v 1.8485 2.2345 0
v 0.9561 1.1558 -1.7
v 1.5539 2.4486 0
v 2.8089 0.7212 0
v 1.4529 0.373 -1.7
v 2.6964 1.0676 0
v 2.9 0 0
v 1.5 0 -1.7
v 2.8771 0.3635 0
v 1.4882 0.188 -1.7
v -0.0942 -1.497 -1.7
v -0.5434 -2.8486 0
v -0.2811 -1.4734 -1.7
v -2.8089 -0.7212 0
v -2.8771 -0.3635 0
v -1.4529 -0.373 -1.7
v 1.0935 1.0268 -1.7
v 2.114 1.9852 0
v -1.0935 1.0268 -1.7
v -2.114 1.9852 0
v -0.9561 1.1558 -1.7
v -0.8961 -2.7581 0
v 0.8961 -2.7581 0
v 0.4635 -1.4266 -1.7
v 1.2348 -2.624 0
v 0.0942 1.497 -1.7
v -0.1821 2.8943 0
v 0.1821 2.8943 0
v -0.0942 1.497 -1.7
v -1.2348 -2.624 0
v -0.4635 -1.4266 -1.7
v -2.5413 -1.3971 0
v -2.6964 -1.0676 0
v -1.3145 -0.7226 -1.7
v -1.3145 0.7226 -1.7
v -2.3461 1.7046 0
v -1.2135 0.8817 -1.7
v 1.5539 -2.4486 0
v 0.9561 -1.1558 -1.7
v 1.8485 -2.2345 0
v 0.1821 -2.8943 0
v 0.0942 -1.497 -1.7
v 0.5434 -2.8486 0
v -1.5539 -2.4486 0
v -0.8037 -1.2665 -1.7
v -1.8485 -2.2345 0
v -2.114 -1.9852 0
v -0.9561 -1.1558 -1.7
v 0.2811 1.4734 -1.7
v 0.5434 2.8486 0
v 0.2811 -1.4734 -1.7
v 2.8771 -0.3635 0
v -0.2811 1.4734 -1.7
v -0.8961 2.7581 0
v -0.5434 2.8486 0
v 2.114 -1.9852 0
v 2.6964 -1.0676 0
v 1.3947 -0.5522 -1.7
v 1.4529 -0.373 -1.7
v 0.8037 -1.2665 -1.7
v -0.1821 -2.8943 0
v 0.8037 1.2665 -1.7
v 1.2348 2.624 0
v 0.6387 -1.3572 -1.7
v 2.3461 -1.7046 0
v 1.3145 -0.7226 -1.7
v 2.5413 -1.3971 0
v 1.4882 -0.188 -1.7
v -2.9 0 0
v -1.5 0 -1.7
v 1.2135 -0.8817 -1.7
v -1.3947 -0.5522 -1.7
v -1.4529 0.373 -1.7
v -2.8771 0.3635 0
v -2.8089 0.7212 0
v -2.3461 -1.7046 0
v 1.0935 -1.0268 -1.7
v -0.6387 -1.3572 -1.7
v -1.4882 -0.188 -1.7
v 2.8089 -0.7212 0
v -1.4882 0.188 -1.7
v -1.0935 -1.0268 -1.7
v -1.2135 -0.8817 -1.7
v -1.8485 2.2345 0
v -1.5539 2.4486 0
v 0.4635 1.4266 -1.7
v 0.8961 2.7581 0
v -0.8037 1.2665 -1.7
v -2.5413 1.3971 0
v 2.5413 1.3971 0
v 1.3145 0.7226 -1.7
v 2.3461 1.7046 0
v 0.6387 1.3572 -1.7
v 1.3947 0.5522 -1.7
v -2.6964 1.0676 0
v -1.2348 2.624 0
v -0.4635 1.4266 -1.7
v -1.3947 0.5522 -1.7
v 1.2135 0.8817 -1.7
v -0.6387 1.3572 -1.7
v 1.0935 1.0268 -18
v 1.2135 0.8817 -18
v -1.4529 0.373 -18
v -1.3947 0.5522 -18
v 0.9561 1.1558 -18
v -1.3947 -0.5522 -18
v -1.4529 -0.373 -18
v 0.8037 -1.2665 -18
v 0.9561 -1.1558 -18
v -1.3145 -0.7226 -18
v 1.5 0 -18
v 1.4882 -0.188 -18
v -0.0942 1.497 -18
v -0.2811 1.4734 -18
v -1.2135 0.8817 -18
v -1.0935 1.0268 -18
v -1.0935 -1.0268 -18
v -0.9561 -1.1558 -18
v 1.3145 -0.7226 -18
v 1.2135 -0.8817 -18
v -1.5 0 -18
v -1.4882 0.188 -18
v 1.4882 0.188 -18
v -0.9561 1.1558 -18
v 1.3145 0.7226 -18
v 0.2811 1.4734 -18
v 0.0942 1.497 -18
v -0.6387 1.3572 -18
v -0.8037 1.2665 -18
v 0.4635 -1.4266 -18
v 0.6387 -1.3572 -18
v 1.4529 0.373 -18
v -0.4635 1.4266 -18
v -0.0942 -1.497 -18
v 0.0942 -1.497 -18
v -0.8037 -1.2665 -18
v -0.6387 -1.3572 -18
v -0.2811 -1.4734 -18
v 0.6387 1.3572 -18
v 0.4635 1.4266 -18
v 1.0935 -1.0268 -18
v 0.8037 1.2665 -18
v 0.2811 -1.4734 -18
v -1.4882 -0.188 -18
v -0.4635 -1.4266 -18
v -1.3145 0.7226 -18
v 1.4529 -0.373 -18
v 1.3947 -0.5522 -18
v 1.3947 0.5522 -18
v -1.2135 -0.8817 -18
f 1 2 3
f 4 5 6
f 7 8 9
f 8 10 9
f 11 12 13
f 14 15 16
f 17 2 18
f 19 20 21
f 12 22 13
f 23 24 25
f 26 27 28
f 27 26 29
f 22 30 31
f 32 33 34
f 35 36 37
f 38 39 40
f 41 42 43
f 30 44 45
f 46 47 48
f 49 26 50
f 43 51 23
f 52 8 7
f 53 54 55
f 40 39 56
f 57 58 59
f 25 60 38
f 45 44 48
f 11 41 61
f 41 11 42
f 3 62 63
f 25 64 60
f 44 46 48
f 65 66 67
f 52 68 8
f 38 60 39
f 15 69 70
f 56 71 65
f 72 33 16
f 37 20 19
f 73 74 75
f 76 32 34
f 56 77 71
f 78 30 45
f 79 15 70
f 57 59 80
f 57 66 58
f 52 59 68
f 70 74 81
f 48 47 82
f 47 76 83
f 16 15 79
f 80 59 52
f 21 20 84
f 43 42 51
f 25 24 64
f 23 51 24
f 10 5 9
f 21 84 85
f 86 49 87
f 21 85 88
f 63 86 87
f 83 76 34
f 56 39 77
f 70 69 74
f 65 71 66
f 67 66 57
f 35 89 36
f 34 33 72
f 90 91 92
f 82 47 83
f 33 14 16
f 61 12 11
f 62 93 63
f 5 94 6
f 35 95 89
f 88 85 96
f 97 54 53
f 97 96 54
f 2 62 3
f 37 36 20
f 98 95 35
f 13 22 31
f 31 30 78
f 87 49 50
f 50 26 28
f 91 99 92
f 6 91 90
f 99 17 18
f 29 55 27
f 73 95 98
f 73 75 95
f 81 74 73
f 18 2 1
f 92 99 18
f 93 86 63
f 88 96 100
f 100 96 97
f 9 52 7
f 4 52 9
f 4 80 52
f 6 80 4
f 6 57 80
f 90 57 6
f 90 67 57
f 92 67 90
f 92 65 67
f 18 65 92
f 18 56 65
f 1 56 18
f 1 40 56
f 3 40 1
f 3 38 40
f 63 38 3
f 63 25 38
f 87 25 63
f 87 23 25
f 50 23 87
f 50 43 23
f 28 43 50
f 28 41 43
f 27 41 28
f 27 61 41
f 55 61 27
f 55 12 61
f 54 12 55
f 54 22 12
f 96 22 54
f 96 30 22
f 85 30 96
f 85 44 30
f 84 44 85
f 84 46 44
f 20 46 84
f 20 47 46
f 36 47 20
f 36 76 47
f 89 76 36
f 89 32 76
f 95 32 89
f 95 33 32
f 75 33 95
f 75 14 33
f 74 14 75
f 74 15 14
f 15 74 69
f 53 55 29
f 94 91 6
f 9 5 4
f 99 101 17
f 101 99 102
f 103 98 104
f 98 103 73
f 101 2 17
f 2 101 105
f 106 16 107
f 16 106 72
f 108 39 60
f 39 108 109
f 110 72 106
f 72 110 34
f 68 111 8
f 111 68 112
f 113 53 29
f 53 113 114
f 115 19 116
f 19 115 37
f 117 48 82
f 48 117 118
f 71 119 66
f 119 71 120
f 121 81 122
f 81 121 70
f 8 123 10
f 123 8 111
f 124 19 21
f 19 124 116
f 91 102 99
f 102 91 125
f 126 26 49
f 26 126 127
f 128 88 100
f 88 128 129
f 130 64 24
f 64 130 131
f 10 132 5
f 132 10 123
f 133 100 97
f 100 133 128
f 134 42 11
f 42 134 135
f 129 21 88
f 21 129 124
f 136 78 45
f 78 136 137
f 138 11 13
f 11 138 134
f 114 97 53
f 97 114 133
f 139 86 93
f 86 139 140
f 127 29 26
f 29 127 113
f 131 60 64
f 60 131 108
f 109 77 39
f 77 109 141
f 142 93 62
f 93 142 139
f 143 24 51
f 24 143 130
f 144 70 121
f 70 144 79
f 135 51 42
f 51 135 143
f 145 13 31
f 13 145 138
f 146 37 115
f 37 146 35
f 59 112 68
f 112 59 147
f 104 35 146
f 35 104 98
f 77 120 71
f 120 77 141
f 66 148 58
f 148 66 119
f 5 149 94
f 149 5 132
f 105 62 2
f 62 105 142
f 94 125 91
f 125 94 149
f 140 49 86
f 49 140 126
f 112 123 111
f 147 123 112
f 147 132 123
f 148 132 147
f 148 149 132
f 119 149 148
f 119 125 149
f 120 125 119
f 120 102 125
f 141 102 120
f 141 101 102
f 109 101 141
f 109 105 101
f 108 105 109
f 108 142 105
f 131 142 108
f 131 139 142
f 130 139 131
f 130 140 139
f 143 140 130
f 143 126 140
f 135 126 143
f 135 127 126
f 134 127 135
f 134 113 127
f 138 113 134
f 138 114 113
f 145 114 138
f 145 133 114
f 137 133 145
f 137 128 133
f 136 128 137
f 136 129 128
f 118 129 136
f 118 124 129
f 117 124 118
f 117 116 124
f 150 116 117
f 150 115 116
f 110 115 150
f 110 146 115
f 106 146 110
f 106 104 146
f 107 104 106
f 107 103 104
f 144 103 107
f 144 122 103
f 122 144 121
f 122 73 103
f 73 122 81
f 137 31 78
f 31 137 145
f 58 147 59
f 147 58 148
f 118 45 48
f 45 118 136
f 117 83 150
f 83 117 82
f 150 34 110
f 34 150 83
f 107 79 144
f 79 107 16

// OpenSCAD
// Generated by SolidPython 1.1.3 on 2023-03-13 21:43:02
$fn = 50;


difference() {
	union() {
		translate(v = [0, 0, -1.7000000000]) {
			rotate(a = [0, 0, 0]) {
				cylinder(h = 1.7000000000, r1 = 1.5000000000, r2 = 2.9000000000);
			}
		}
		translate(v = [0, 0, -18]) {
			rotate(a = [0, 0, 0]) {
				cylinder(h = 18, r = 1.5000000000);
			}
		}
	}
	union();
}
/***********************************************
*********      SolidPython code:      **********
************************************************
 
from solid import *
import os
import subprocess

import oomB

import opsc_library_gen

mode = "laser"
#mode = "3d_print"

defined_objects = {}

radius_dict = {}
countersunk_dict = {}


def set_mode(m):
    global mode
    mode = m
    radius_dict['M6'] = 6.5/2
    radius_dict['M3'] = 3.3/2
    if mode == "laser":
        radius_dict['M6'] = 6/2
        radius_dict['M3'] = 3/2

    countersunk_dict['M3'] = {}
    countersunk_dict['M3']['little_rad'] = radius_dict['M3']
    countersunk_dict['M3']['big_rad'] = (5.5+0.6)/2
    if mode == "laser":
        countersunk_dict['M3']['big_rad'] = (4.75+0.6)/2
        countersunk_dict['M3']['little_rad'] = (4.75+0.6)/2

    countersunk_dict['M3']['height'] = 1.7


def opsc_make_object(filename, objects, save_type="none",resolution=50, layers = 1, tilediff = 200, mode="laser", overwrite=True):
    if overwrite or not os.path.exists(filename):
        set_mode(mode)
        save_type = save_type.lower()
        os.makedirs(os.path.dirname(filename), exist_ok=True)
        final_object = opsc_get_object(objects, mode = mode)
        # Save the final object to the specified filename    
        scad_render_to_file(final_object, filename, file_header='$fn = %s;' % resolution, include_orig_code=True)
        if save_type == "all":
            saveToAll(filename)
        elif save_type == "dxf":
            saveToDxf(filename)
        if mode == "laser":
            filename_laser = filename.replace(".scad","-flat.scad")
            scad_render_to_file(getLaser(final_object, layers=layers, tilediff=tilediff), filename_laser, file_header='$fn = %s;' % resolution, include_orig_code=True)
            if save_type == "all":
                saveToAll(filename_laser)
            elif save_type == "dxf":
                saveToDxf(filename_laser)


def opsc_get_object(objects, mode = "laser"):
    # Create the solidpython objects only include the positive objects and if they don't have inclusion or their inclusion is either all or mode
    # Initialize an empty list to store the results
    positive_objects = []

    # Iterate over the "objects" list
    for obj in objects:
        # Check if the current object has a "type" key with a value of "positive"
        if obj['type'] == 'positive':
            # Check if the current object has an "inclusion" key and its value matches "mode",
            # or if the current object does not have an "inclusion" key at all
            if not 'inclusion' in obj or obj['inclusion'] == "all" or obj['inclusion'] == mode:
                # Call the "get_opsc_item" function with the current object as an argument
                opsc_item = get_opsc_item(obj)
                # Add the result to the "positive_objects" list
                positive_objects.append(opsc_item)
# Initialize an empty list to store the results
    negative_objects = []

    # Iterate over the "objects" list
    for obj in objects:
        # Check if the current object has a "type" key with a value of "negative"
        if obj['type'] == 'negative':
            # Check if the current object has an "inclusion" key and its value matches "mode",
            # or if the current object does not have an "inclusion" key at all
            if not 'inclusion' in obj or obj['inclusion'] == "all" or obj['inclusion'] == mode:
                # Call the "get_opsc_item" function with the current object as an argument
                opsc_item = get_opsc_item(obj)
                # Add the result to the "negative_objects" list
                negative_objects.append(opsc_item)
    
    #positive_objects = [get_opsc_item(obj) for obj in objects if obj['type'] == 'positive']
    #negative_objects = [get_opsc_item(obj) for obj in objects if obj['type'] == 'negative']
    # Union the positive objects
    positive_object = union()(*positive_objects)
    # Union the negative objects
    negative_object = union()(*negative_objects)
    # Create the final object by subtracting the negative objects from the positive objects
    return difference()(positive_object, negative_object)

def get_opsc_item(params):
    # A dictionary to map radius string values to numerical values
    #radius_dict = {'small': 5, 'medium': 10, 'large': 15}
    # An array of function names for basic shapes
    basic_shapes = ['cube', 'sphere', 'cylinder']
    
    # An array of function names for other shapes
    other_shapes = ['hole', 'slot', 'rounded_rectangle', 'countersunk', 'polyg']
    


    # Convert radius to r if present, and remove radius from the params dictionary
    if 'radius' in params:
        if isinstance(params['radius'], str):
            # Use the radius_dict to map the radius string value to a numerical value
            params['r'] = radius_dict[params['radius']]
        else:
            params['r'] = params['radius']
        del params['radius']
    

    # Check if the object type is a basic shape
    if params['shape'] in basic_shapes:
        # Remove shape and unexpected dictionary values
        allowed_keys = {'size', 'r', 'r1', 'r2', 'd', 'h', 'rw', 'rh', 'dw', 'dh'}
        shape_params = {k: v for k, v in params.items() if k in allowed_keys}

        #params['m'] = "#"
        ###split for adding modifier
        try:
            m = params['m']
            func = globals()[params['shape']]
            return_value = get_opsc_transform(params,func(**shape_params))
            return_value = (return_value).set_modifier(m)
            return return_value
        except KeyError as e:
            return get_opsc_transform(params,globals()[params['shape']](**shape_params))
        
    elif params['shape'] == 'polygon':
        # Remove shape and unexpected dictionary values
        h  = params['height']
        allowed_keys = {'points'}
        shape_params = {k: v for k, v in params.items() if k in allowed_keys}

        # Call the corresponding function for the shape parameter, using ** notation to pass the shape_params dictionary as keyword arguments
        params["rot"] = [0,0,0]        
        try:
            m = params['m']
            func = globals()[params['shape']]
            return_value = get_opsc_transform(params,linear_extrude(h)(globals()[params['shape']](**shape_params)))
            return_value = (return_value).set_modifier(m)
            return return_value
        except KeyError as e:
            return_value = get_opsc_transform(params,linear_extrude(h)(globals()[params['shape']](**shape_params)))
            return_value = (return_value)
            return return_value


    # If the object type is not a basic shape, check if it's a defined object or one of the other shapes
    elif params['shape'] in other_shapes:
        # Call the corresponding function for the shape parameter, passing the params dictionary as an argument
        p2 = copy.deepcopy(params)
        p2["pos"] = [0,0,0]
        return get_opsc_transform(params,globals()[params['shape']](p2))
    
    # If the object is not a basic shape or a defined object, try to import it from a .scad file
    else:
        obj = defined_objects[params['shape']]
        return get_opsc_transform(params,obj)

def get_opsc_transform(params, solid_obj):
    # Rotate the object based on the 'rot' field in the params dictionary, or the 'rotX', 'rotY', and 'rotZ' fields if 'rot' is not present
    rot = params.get('rot', [])
    if rot:
        rotX, rotY, rotZ = rot
    else:
        rotX = params.get('rotX', 0)
        rotY = params.get('rotY', 0)
        rotZ = params.get('rotZ', 0)
    solid_obj = rotate([rotX, rotY, rotZ])(solid_obj)

    # Translate the object based on the 'pos' field in the params dictionary, or the 'x', 'y', and 'z' fields if 'pos' is not present
    pos = params.get('pos', [])
    if pos:
        x, y, z = pos
    else:
        x = params.get('x', 0)
        y = params.get('y', 0)
        z = params.get('z', 0)
    solid_obj = translate([x, y, z])(solid_obj)
    return solid_obj


import random

def opsc_easy_array(type, shape, repeats, pos_start, shift_arr, **kwargs):
    for i in range(0,3):
        repeats.append(1)
        pos_start.append(0)
        shift_arr.append(0)
    return_objects = []

    for x in range(0,repeats[0]):
        for y in range(0,repeats[1]):
            for z in range(0,repeats[2]):
                return_objects.append(opsc_easy(type, shape, pos=[pos_start[0]+x*shift_arr[0],pos_start[1]+y*shift_arr[1],pos_start[2]+z*shift_arr[2]], **kwargs))
    return return_objects                



def opsc_easy(type, shape, **kwargs):
    obj = {
        'type': type,
        'shape': shape
    }
    for param in ['size', 'r', 'r1', 'r2', 'd', 'h', 'rw', 'rh', 'dw', 'dh', 'pos', 'x', 'y', 'z', 'rot', 'rotX', 'rotY', 'rotZ', "w", "inclusion", 'sides', 'height', "m"]:
        if param in kwargs:
            obj[param] = kwargs[param]
    return obj

def hole(params):
    p2 = copy.deepcopy(params)  
    # Check if the radius is a string and replace it with the corresponding value from the dictionary
    if isinstance(p2['r'], str):
        p2['r'] = radius_dict[p2['r']]
    
    # Set the height to 100 if not specified
    if 'h' not in p2:
        p2['h'] = 100
        p2["pos"] = [0,0,-50]
    p2["center"] = True
    # Create the cylinder object
    p2["shape"] = "cylinder"
    p2["type"] = "positive"

    return get_opsc_item(p2)

import copy

def countersunk(params):
    p2 = copy.deepcopy(params)
    counter_rad = p2['r']
    p2['r'] = radius_dict[p2['r']]
    hp = copy.deepcopy(p2)
    hp["type"] = "positive"
    hp["shape"] = "hole"
    del hp["rot"]
    hol = get_opsc_item(hp)
    
    cp = copy.deepcopy(p2)
    cp["h"] = countersunk_dict[counter_rad]["height"]
    cp["r2"] = countersunk_dict[counter_rad]["little_rad"]
    cp["r1"] = countersunk_dict[counter_rad]["big_rad"]
    del cp["r"]
    del cp["rot"]
    cp["type"] = "positive"
    cp["shape"] = "cylinder"
    cp["pos"] = [0,0,0]

    top = get_opsc_item(cp)
    return union()(hol,top)



def slot(params):  
    p2 = copy.deepcopy(params) 
    if isinstance(p2['r'], str):
        p2['r'] = radius_dict[p2['r']]
    p2["type"] = "positive"
    p2["shape"] = "hole"
    del p2["rot"]
    p2["pos"] = [0,0,0]
    left = copy.deepcopy(p2)
    right = copy.deepcopy(p2)
    left["pos"][0] = p2["w"] / 2 - p2["r"] 
    
    right["pos"][0] = -p2["w"] / 2 + p2["r"] 
    pass
    leftObj = get_opsc_item(left)
    rightObj = get_opsc_item(right)
    return hull()(leftObj, rightObj)

def rounded_rectangle(params):   
    p2 = copy.deepcopy(params) 
    p2["h"] = p2["size"][2]
    p2["pos"] = p2.get("pos", [0, 0, 0]) 
    p2["type"] = "positive"
    p2["shape"] = "hole"
    p2["pos"] = [0,0,0]
    
    if 'rot' in p2:
        del p2["rot"]   
    if 'r' not in p2:
        p2["r"] = 5 
    tl = copy.deepcopy(p2)
    tr = copy.deepcopy(p2)
    bl = copy.deepcopy(p2)
    br = copy.deepcopy(p2)
    tl["pos"][0] = -(p2["size"][0] - p2["r"]*2)/2
    tl["pos"][1] = (p2["size"][1] - p2["r"]*2)/2
    tr["pos"][0] = (p2["size"][0] - p2["r"]*2)/2
    tr["pos"][1] = (p2["size"][1] - p2["r"]*2)/2
    bl["pos"][0] = -(p2["size"][0] - p2["r"]*2)/2
    bl["pos"][1] = -(p2["size"][1] - p2["r"]*2)/2
    br["pos"][0] = (p2["size"][0] - p2["r"]*2)/2
    br["pos"][1] = -(p2["size"][1] - p2["r"]*2)/2
    del tl["size"]
    del tr["size"]
    del bl["size"]
    del br["size"]
    tlo = get_opsc_item(tl)
    tro = get_opsc_item(tr)
    blo = get_opsc_item(bl)
    bro = get_opsc_item(br)    
    return hull()(tlo, tro, blo, bro)



def polyg(params):
    p2 = copy.deepcopy(params) 
    p2["type"] = "positive"
    p2["shape"] = "polygon"
    p2["pos"] = [0,0,0]
    sides = p2["sides"]
    radius = p2["r"]    
    angles = [i * 360 / sides for i in range(sides)]
    points = regular_polygon(sides, radius)
    
    p2["points"] = points
    return get_opsc_item(p2)

import math

def regular_polygon(num_sides, radius):
    # Calculate the angle between each side
    angle = 2 * math.pi / num_sides

    # Calculate the points of the polygon
    points = []
    for i in range(num_sides):
        x = radius * math.cos(i * angle)
        y = radius * math.sin(i * angle)
        points.append((x, y))
    return points

def import_scad_object(filename):
    # Import the .scad file and convert it to a solidpython object
    #filename = "parts"
    obj = import_scad(filename)
    return obj.main()



import os
import solid as solidpython

# A dictionary to store the defined objects


def load_scad_objects():
    opsc_library_gen.gen_library(defined_objects)

import random

def test(num_objects):
    objects = []
    for i in range(num_objects):
        # Choose a random shape
        #shape = random.choice(['cube', 'sphere', 'cylinder', 'hole', 'slot', "rounded_rectangle"])
        shape = random.choice(["rounded_rectangle"])

        # Choose a random type
        type = random.choice(['positive', 'negative'])
        
        # Create an empty object dictionary
        obj = {'shape': shape, 'type': type}
        
        # Set shape-specific parameters
        if obj['shape'] in ['cube']:
            obj['size'] =  [random.uniform(5, 15), random.uniform(5, 15), random.uniform(5, 15)]
        if obj['shape'] in ['rounded_rectangle']:
            obj['size'] =  [random.uniform(5, 15), random.uniform(5, 15), random.uniform(5, 15)]
            obj['r'] = random.uniform(0.5, 5)
        elif obj['shape'] == 'sphere':
            obj['r'] = random.uniform(5, 15)
        elif obj['shape'] in ['cylinder', 'hole']:
            obj['r'] = random.uniform(0.5, 5)
            obj['h'] = random.uniform(5, 15)
        elif obj['shape'] == 'slot':
            obj['r'] = random.uniform(0.5, 5)
            obj['h'] = random.uniform(5, 15)
            obj['w'] = random.uniform(5, 15)
        
        # Set a random position and rotation
        obj['pos'] = [random.uniform(-20, 20), random.uniform(-20, 20), random.uniform(-20, 20)]
        obj['rot'] = [random.uniform(-180, 180), random.uniform(-180, 180), random.uniform(-180, 180)]
        
        # Add the object to the list
        objects.append(obj)
    return objects

####### old file saving
def saveToAll(fileIn):
    saveToStl(fileIn)
    saveToDxf(fileIn)
    saveToPng(fileIn)
    saveToSvg(fileIn)

def saveToDxf(fileIn, fileOut="", copy_to_laser=True):
    if fileOut == "":
        fileOut = fileIn.replace(".scad",".dxf")
    saveToFile(fileIn, fileOut)


    
def saveToPng(fileIn, fileOut="",extra="--render"):
    if fileOut == "":
        fileOut = fileIn.replace(".scad",".png")
    saveToFile(fileIn, fileOut)

def saveToStl(fileIn, fileOut=""):
    if fileOut == "":
        fileOut = fileIn.replace(".scad",".stl")
    saveToFile(fileIn, fileOut)
    
def saveToSvg(fileIn, fileOut=""):
    if fileOut == "":
        fileOut = fileIn.replace(".scad",".svg")
    saveToFile(fileIn, fileOut)

def saveToFile(fileIn, fileOut,extra=""):
    #extra = extra + " --colorscheme Tomorrow"

    launchStr = 'openscad -o "' + fileOut + '"' + extra + ' "' + fileIn + '"'
    if ".png" in fileOut:
        launchStr = launchStr + " --render"
    print("            saveToFile launch string: " + launchStr)
    subprocess.run(launchStr)
    x=0

def getLaser(final_object,start=1.5,layers=1,thickness=3,tilediff=200):
        rv= []

        for x in range(layers):
            rv.append(translate([0,x*tilediff,0])(
                    projection()(
                        intersection()(translate([-500,-500,start+x*thickness])(cube(size=[1000,1000,0.1])),
                            final_object
                        )
                    )
            )
            )
            
        return union()(rv)

set_mode("laser")
load_scad_objects() 
 
************************************************/
